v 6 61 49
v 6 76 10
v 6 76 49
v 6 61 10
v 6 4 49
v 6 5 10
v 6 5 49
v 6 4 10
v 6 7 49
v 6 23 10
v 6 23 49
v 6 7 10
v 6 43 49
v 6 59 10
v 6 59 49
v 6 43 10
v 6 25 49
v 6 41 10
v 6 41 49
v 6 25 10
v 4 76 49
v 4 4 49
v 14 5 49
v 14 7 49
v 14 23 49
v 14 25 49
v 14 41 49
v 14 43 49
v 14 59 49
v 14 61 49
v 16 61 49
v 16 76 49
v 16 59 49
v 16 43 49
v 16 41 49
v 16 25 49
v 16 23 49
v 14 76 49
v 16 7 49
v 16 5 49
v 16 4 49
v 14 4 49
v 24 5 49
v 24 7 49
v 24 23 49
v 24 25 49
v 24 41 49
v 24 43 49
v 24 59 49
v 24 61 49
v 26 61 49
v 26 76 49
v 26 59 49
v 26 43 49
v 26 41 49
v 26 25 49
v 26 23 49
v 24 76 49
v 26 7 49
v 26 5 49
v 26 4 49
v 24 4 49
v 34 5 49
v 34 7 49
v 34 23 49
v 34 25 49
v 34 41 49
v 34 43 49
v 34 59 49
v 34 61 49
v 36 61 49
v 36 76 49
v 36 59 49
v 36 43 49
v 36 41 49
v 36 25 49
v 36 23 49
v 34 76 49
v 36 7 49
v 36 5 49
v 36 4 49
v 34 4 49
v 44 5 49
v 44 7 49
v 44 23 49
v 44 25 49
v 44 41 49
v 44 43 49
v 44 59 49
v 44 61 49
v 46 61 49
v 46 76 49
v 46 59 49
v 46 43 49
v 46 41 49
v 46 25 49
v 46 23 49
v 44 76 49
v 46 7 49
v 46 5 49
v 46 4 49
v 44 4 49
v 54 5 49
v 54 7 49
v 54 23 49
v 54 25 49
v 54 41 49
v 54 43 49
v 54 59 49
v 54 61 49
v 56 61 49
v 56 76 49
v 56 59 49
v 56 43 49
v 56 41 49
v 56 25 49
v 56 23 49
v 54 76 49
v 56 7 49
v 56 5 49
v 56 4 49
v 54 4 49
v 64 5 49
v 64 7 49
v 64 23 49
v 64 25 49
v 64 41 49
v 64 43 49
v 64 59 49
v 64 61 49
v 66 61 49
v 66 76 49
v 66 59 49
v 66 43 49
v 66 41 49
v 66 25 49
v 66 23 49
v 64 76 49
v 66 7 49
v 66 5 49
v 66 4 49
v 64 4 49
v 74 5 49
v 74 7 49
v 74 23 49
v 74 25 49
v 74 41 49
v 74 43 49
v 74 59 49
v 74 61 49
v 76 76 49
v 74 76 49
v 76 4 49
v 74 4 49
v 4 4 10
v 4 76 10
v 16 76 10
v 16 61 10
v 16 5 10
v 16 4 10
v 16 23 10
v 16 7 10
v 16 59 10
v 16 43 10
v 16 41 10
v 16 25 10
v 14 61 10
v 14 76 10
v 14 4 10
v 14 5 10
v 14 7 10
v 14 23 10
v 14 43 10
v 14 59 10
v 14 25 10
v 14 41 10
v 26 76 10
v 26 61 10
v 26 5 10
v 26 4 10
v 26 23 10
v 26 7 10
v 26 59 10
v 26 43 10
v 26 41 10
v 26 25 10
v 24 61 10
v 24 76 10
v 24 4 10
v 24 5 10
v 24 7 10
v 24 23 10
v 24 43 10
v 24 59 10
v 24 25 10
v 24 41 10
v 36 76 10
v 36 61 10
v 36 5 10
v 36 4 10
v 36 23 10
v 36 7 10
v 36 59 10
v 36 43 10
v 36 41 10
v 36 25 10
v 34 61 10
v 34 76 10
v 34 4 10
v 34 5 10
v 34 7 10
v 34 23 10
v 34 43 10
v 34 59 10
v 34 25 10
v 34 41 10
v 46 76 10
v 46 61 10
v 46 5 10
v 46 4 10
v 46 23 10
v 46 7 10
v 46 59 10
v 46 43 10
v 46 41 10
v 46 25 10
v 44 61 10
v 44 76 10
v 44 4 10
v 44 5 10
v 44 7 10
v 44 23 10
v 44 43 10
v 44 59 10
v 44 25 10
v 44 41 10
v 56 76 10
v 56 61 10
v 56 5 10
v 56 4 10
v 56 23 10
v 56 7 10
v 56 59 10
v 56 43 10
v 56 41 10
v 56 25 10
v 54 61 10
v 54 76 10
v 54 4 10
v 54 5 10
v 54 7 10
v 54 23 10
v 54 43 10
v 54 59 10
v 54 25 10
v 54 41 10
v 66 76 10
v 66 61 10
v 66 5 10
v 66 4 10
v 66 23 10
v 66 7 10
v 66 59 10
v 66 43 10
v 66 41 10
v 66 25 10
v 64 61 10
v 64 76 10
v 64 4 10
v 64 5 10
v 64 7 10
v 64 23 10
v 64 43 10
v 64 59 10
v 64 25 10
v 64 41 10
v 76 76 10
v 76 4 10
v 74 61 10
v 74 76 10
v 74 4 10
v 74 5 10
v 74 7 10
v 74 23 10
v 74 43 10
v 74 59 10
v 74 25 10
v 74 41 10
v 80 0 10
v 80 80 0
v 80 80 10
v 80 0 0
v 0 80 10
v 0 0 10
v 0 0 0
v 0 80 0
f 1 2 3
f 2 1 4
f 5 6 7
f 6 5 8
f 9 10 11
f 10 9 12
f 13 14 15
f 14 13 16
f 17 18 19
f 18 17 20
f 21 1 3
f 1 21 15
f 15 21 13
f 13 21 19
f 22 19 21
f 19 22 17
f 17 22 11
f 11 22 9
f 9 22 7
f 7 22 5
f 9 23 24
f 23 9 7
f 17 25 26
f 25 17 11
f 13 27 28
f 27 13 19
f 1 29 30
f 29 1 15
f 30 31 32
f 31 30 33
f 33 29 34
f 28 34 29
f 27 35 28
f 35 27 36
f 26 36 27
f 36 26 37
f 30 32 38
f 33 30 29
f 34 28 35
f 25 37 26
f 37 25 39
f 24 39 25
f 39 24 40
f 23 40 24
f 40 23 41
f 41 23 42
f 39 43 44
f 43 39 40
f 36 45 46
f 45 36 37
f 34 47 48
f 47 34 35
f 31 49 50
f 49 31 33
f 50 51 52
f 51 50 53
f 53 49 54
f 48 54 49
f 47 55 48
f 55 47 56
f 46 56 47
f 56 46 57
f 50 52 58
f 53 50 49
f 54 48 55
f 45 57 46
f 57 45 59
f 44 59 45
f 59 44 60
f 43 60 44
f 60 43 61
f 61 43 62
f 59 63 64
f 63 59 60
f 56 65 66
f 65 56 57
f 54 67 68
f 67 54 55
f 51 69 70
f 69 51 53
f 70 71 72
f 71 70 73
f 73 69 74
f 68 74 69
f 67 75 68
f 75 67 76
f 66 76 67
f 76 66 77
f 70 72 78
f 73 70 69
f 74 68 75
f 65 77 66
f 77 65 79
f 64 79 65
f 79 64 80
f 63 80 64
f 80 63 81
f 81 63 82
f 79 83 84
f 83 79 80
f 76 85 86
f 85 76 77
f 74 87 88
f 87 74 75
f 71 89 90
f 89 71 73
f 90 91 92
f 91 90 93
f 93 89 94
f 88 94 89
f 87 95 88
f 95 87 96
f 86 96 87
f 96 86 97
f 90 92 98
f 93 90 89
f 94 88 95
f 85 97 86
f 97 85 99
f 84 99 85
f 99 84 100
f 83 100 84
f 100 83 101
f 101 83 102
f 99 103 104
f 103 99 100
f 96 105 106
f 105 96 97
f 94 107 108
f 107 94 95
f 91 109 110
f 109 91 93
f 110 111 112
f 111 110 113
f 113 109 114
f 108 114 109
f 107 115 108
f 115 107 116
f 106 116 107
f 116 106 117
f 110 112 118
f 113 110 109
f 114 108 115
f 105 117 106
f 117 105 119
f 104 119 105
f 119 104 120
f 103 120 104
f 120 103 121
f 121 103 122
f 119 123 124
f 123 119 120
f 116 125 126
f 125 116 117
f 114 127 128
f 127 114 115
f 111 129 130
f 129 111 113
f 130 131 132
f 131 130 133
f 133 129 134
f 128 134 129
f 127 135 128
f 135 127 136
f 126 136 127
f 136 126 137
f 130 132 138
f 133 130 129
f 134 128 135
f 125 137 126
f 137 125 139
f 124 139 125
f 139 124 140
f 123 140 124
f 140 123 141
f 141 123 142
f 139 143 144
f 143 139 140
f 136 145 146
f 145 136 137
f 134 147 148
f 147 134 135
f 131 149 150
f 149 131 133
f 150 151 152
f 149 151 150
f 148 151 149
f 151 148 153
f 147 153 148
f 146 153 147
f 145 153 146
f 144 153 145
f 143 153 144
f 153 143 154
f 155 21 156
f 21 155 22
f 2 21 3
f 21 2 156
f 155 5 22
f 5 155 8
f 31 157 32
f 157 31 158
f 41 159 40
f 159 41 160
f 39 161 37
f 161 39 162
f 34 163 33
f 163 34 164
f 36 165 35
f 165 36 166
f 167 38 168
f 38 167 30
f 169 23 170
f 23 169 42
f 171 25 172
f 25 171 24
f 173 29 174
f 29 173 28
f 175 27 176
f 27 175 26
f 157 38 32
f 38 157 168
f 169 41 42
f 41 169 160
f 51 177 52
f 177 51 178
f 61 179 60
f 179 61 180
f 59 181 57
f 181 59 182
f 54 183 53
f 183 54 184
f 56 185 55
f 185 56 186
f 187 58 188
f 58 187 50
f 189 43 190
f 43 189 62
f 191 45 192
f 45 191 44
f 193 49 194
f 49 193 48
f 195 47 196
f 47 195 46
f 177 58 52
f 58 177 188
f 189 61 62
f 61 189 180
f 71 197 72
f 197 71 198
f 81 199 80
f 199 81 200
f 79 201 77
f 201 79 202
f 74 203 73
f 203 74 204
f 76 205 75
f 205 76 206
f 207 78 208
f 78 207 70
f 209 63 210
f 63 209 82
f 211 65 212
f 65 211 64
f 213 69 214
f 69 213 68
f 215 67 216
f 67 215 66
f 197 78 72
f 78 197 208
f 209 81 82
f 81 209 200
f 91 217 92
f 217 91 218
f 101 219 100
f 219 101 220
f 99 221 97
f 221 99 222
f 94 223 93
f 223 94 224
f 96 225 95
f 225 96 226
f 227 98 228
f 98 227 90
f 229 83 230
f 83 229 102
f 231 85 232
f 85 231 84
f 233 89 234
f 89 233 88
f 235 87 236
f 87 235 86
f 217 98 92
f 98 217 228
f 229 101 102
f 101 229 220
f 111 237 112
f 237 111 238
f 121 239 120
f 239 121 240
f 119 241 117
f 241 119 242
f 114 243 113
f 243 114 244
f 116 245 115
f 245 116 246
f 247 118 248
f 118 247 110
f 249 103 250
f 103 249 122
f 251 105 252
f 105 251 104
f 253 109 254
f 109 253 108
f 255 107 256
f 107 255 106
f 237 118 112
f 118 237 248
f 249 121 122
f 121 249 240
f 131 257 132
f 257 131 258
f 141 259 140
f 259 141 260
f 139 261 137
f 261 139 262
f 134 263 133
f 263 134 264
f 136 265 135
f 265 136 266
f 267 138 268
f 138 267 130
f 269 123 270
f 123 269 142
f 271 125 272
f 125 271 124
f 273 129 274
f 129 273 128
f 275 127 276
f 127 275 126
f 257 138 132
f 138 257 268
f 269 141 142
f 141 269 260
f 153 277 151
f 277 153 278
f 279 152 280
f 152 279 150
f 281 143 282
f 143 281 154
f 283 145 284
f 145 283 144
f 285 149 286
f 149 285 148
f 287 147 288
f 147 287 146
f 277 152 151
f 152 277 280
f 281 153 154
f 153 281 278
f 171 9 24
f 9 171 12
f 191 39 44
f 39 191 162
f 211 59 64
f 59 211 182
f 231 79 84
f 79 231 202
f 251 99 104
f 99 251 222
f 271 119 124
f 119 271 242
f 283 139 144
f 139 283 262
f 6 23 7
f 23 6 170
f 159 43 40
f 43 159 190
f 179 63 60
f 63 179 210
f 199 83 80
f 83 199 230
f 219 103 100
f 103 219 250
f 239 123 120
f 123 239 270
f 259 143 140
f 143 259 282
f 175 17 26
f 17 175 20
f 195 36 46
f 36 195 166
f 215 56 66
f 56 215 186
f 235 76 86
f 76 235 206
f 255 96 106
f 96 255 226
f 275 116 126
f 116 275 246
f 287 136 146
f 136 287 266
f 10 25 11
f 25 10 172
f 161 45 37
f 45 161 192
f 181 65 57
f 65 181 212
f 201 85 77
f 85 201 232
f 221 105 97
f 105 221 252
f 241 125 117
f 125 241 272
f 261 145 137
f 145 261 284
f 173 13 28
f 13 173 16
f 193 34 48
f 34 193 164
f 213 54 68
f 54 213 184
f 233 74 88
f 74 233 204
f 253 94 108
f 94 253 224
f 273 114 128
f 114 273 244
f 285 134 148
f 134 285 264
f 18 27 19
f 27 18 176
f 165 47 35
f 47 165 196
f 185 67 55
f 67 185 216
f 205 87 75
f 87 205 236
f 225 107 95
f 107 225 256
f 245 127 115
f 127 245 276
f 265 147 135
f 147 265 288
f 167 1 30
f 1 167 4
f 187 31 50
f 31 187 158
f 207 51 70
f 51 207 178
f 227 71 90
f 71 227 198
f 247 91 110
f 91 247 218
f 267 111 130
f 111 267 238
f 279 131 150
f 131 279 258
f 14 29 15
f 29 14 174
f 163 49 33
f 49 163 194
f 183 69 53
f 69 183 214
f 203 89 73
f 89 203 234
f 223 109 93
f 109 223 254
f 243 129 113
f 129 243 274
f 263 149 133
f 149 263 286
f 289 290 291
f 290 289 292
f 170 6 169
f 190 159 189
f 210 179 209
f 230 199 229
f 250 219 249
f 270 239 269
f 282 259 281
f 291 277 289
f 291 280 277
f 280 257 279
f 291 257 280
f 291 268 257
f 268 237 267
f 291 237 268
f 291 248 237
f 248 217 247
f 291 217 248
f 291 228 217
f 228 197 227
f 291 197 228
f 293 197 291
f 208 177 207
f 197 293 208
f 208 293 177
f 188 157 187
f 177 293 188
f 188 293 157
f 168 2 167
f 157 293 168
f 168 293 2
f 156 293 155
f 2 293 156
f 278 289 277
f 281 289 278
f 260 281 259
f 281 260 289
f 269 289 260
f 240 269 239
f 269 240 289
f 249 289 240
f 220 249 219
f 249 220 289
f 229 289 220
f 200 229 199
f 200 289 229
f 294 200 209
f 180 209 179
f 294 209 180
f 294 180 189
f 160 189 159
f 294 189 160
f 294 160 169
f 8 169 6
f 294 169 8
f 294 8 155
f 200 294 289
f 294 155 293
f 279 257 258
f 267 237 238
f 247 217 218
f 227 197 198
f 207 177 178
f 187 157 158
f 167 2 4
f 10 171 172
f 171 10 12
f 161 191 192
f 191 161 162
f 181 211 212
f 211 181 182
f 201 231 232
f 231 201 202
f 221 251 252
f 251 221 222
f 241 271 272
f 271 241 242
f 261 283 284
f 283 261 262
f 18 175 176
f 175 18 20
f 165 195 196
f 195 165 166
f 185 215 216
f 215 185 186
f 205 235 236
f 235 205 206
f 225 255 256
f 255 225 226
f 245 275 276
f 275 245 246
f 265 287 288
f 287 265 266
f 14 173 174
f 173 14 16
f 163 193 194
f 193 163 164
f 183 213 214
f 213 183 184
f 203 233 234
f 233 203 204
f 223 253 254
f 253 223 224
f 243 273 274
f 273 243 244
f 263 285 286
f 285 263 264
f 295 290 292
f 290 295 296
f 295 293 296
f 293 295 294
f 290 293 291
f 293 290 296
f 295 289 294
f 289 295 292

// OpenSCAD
$fn = 32;

// ----------------------------------------------------------------------
// Heatsink: cross fin block
// ----------------------------------------------------------------------

// --- parameters (mm) ---
base_l = 80;              // base length, X
base_w = 80;              // base width, Y
base_t = 10;              // base plate thickness
fin_h = 40;               // fin height above the base
fin_t = 2;                // fin thickness
edge = 4;                 // margin from the base ends
pitch = 10;               // fin pitch
rib_pitch = 18;           // cross rib pitch

n_fins = floor((base_l - 2 * edge - fin_t) / pitch) + 1;  // fin count
total_h = base_t + fin_h - 1;  // overall height
n_ribs = floor((base_w - 2 * edge) / rib_pitch);  // rib count

union() {
  cube([base_l, base_w, base_t]);
  for (i = [0 : n_fins - 1])
    translate([edge + i * pitch, edge, base_t - 1])
      cube([fin_t, base_w - 2 * edge, fin_h]);
  for (i = [0 : n_ribs - 1])
    translate([edge, edge + 1 + i * rib_pitch, base_t - 1])
      cube([base_l - 2 * edge, fin_t, fin_h]);
}
